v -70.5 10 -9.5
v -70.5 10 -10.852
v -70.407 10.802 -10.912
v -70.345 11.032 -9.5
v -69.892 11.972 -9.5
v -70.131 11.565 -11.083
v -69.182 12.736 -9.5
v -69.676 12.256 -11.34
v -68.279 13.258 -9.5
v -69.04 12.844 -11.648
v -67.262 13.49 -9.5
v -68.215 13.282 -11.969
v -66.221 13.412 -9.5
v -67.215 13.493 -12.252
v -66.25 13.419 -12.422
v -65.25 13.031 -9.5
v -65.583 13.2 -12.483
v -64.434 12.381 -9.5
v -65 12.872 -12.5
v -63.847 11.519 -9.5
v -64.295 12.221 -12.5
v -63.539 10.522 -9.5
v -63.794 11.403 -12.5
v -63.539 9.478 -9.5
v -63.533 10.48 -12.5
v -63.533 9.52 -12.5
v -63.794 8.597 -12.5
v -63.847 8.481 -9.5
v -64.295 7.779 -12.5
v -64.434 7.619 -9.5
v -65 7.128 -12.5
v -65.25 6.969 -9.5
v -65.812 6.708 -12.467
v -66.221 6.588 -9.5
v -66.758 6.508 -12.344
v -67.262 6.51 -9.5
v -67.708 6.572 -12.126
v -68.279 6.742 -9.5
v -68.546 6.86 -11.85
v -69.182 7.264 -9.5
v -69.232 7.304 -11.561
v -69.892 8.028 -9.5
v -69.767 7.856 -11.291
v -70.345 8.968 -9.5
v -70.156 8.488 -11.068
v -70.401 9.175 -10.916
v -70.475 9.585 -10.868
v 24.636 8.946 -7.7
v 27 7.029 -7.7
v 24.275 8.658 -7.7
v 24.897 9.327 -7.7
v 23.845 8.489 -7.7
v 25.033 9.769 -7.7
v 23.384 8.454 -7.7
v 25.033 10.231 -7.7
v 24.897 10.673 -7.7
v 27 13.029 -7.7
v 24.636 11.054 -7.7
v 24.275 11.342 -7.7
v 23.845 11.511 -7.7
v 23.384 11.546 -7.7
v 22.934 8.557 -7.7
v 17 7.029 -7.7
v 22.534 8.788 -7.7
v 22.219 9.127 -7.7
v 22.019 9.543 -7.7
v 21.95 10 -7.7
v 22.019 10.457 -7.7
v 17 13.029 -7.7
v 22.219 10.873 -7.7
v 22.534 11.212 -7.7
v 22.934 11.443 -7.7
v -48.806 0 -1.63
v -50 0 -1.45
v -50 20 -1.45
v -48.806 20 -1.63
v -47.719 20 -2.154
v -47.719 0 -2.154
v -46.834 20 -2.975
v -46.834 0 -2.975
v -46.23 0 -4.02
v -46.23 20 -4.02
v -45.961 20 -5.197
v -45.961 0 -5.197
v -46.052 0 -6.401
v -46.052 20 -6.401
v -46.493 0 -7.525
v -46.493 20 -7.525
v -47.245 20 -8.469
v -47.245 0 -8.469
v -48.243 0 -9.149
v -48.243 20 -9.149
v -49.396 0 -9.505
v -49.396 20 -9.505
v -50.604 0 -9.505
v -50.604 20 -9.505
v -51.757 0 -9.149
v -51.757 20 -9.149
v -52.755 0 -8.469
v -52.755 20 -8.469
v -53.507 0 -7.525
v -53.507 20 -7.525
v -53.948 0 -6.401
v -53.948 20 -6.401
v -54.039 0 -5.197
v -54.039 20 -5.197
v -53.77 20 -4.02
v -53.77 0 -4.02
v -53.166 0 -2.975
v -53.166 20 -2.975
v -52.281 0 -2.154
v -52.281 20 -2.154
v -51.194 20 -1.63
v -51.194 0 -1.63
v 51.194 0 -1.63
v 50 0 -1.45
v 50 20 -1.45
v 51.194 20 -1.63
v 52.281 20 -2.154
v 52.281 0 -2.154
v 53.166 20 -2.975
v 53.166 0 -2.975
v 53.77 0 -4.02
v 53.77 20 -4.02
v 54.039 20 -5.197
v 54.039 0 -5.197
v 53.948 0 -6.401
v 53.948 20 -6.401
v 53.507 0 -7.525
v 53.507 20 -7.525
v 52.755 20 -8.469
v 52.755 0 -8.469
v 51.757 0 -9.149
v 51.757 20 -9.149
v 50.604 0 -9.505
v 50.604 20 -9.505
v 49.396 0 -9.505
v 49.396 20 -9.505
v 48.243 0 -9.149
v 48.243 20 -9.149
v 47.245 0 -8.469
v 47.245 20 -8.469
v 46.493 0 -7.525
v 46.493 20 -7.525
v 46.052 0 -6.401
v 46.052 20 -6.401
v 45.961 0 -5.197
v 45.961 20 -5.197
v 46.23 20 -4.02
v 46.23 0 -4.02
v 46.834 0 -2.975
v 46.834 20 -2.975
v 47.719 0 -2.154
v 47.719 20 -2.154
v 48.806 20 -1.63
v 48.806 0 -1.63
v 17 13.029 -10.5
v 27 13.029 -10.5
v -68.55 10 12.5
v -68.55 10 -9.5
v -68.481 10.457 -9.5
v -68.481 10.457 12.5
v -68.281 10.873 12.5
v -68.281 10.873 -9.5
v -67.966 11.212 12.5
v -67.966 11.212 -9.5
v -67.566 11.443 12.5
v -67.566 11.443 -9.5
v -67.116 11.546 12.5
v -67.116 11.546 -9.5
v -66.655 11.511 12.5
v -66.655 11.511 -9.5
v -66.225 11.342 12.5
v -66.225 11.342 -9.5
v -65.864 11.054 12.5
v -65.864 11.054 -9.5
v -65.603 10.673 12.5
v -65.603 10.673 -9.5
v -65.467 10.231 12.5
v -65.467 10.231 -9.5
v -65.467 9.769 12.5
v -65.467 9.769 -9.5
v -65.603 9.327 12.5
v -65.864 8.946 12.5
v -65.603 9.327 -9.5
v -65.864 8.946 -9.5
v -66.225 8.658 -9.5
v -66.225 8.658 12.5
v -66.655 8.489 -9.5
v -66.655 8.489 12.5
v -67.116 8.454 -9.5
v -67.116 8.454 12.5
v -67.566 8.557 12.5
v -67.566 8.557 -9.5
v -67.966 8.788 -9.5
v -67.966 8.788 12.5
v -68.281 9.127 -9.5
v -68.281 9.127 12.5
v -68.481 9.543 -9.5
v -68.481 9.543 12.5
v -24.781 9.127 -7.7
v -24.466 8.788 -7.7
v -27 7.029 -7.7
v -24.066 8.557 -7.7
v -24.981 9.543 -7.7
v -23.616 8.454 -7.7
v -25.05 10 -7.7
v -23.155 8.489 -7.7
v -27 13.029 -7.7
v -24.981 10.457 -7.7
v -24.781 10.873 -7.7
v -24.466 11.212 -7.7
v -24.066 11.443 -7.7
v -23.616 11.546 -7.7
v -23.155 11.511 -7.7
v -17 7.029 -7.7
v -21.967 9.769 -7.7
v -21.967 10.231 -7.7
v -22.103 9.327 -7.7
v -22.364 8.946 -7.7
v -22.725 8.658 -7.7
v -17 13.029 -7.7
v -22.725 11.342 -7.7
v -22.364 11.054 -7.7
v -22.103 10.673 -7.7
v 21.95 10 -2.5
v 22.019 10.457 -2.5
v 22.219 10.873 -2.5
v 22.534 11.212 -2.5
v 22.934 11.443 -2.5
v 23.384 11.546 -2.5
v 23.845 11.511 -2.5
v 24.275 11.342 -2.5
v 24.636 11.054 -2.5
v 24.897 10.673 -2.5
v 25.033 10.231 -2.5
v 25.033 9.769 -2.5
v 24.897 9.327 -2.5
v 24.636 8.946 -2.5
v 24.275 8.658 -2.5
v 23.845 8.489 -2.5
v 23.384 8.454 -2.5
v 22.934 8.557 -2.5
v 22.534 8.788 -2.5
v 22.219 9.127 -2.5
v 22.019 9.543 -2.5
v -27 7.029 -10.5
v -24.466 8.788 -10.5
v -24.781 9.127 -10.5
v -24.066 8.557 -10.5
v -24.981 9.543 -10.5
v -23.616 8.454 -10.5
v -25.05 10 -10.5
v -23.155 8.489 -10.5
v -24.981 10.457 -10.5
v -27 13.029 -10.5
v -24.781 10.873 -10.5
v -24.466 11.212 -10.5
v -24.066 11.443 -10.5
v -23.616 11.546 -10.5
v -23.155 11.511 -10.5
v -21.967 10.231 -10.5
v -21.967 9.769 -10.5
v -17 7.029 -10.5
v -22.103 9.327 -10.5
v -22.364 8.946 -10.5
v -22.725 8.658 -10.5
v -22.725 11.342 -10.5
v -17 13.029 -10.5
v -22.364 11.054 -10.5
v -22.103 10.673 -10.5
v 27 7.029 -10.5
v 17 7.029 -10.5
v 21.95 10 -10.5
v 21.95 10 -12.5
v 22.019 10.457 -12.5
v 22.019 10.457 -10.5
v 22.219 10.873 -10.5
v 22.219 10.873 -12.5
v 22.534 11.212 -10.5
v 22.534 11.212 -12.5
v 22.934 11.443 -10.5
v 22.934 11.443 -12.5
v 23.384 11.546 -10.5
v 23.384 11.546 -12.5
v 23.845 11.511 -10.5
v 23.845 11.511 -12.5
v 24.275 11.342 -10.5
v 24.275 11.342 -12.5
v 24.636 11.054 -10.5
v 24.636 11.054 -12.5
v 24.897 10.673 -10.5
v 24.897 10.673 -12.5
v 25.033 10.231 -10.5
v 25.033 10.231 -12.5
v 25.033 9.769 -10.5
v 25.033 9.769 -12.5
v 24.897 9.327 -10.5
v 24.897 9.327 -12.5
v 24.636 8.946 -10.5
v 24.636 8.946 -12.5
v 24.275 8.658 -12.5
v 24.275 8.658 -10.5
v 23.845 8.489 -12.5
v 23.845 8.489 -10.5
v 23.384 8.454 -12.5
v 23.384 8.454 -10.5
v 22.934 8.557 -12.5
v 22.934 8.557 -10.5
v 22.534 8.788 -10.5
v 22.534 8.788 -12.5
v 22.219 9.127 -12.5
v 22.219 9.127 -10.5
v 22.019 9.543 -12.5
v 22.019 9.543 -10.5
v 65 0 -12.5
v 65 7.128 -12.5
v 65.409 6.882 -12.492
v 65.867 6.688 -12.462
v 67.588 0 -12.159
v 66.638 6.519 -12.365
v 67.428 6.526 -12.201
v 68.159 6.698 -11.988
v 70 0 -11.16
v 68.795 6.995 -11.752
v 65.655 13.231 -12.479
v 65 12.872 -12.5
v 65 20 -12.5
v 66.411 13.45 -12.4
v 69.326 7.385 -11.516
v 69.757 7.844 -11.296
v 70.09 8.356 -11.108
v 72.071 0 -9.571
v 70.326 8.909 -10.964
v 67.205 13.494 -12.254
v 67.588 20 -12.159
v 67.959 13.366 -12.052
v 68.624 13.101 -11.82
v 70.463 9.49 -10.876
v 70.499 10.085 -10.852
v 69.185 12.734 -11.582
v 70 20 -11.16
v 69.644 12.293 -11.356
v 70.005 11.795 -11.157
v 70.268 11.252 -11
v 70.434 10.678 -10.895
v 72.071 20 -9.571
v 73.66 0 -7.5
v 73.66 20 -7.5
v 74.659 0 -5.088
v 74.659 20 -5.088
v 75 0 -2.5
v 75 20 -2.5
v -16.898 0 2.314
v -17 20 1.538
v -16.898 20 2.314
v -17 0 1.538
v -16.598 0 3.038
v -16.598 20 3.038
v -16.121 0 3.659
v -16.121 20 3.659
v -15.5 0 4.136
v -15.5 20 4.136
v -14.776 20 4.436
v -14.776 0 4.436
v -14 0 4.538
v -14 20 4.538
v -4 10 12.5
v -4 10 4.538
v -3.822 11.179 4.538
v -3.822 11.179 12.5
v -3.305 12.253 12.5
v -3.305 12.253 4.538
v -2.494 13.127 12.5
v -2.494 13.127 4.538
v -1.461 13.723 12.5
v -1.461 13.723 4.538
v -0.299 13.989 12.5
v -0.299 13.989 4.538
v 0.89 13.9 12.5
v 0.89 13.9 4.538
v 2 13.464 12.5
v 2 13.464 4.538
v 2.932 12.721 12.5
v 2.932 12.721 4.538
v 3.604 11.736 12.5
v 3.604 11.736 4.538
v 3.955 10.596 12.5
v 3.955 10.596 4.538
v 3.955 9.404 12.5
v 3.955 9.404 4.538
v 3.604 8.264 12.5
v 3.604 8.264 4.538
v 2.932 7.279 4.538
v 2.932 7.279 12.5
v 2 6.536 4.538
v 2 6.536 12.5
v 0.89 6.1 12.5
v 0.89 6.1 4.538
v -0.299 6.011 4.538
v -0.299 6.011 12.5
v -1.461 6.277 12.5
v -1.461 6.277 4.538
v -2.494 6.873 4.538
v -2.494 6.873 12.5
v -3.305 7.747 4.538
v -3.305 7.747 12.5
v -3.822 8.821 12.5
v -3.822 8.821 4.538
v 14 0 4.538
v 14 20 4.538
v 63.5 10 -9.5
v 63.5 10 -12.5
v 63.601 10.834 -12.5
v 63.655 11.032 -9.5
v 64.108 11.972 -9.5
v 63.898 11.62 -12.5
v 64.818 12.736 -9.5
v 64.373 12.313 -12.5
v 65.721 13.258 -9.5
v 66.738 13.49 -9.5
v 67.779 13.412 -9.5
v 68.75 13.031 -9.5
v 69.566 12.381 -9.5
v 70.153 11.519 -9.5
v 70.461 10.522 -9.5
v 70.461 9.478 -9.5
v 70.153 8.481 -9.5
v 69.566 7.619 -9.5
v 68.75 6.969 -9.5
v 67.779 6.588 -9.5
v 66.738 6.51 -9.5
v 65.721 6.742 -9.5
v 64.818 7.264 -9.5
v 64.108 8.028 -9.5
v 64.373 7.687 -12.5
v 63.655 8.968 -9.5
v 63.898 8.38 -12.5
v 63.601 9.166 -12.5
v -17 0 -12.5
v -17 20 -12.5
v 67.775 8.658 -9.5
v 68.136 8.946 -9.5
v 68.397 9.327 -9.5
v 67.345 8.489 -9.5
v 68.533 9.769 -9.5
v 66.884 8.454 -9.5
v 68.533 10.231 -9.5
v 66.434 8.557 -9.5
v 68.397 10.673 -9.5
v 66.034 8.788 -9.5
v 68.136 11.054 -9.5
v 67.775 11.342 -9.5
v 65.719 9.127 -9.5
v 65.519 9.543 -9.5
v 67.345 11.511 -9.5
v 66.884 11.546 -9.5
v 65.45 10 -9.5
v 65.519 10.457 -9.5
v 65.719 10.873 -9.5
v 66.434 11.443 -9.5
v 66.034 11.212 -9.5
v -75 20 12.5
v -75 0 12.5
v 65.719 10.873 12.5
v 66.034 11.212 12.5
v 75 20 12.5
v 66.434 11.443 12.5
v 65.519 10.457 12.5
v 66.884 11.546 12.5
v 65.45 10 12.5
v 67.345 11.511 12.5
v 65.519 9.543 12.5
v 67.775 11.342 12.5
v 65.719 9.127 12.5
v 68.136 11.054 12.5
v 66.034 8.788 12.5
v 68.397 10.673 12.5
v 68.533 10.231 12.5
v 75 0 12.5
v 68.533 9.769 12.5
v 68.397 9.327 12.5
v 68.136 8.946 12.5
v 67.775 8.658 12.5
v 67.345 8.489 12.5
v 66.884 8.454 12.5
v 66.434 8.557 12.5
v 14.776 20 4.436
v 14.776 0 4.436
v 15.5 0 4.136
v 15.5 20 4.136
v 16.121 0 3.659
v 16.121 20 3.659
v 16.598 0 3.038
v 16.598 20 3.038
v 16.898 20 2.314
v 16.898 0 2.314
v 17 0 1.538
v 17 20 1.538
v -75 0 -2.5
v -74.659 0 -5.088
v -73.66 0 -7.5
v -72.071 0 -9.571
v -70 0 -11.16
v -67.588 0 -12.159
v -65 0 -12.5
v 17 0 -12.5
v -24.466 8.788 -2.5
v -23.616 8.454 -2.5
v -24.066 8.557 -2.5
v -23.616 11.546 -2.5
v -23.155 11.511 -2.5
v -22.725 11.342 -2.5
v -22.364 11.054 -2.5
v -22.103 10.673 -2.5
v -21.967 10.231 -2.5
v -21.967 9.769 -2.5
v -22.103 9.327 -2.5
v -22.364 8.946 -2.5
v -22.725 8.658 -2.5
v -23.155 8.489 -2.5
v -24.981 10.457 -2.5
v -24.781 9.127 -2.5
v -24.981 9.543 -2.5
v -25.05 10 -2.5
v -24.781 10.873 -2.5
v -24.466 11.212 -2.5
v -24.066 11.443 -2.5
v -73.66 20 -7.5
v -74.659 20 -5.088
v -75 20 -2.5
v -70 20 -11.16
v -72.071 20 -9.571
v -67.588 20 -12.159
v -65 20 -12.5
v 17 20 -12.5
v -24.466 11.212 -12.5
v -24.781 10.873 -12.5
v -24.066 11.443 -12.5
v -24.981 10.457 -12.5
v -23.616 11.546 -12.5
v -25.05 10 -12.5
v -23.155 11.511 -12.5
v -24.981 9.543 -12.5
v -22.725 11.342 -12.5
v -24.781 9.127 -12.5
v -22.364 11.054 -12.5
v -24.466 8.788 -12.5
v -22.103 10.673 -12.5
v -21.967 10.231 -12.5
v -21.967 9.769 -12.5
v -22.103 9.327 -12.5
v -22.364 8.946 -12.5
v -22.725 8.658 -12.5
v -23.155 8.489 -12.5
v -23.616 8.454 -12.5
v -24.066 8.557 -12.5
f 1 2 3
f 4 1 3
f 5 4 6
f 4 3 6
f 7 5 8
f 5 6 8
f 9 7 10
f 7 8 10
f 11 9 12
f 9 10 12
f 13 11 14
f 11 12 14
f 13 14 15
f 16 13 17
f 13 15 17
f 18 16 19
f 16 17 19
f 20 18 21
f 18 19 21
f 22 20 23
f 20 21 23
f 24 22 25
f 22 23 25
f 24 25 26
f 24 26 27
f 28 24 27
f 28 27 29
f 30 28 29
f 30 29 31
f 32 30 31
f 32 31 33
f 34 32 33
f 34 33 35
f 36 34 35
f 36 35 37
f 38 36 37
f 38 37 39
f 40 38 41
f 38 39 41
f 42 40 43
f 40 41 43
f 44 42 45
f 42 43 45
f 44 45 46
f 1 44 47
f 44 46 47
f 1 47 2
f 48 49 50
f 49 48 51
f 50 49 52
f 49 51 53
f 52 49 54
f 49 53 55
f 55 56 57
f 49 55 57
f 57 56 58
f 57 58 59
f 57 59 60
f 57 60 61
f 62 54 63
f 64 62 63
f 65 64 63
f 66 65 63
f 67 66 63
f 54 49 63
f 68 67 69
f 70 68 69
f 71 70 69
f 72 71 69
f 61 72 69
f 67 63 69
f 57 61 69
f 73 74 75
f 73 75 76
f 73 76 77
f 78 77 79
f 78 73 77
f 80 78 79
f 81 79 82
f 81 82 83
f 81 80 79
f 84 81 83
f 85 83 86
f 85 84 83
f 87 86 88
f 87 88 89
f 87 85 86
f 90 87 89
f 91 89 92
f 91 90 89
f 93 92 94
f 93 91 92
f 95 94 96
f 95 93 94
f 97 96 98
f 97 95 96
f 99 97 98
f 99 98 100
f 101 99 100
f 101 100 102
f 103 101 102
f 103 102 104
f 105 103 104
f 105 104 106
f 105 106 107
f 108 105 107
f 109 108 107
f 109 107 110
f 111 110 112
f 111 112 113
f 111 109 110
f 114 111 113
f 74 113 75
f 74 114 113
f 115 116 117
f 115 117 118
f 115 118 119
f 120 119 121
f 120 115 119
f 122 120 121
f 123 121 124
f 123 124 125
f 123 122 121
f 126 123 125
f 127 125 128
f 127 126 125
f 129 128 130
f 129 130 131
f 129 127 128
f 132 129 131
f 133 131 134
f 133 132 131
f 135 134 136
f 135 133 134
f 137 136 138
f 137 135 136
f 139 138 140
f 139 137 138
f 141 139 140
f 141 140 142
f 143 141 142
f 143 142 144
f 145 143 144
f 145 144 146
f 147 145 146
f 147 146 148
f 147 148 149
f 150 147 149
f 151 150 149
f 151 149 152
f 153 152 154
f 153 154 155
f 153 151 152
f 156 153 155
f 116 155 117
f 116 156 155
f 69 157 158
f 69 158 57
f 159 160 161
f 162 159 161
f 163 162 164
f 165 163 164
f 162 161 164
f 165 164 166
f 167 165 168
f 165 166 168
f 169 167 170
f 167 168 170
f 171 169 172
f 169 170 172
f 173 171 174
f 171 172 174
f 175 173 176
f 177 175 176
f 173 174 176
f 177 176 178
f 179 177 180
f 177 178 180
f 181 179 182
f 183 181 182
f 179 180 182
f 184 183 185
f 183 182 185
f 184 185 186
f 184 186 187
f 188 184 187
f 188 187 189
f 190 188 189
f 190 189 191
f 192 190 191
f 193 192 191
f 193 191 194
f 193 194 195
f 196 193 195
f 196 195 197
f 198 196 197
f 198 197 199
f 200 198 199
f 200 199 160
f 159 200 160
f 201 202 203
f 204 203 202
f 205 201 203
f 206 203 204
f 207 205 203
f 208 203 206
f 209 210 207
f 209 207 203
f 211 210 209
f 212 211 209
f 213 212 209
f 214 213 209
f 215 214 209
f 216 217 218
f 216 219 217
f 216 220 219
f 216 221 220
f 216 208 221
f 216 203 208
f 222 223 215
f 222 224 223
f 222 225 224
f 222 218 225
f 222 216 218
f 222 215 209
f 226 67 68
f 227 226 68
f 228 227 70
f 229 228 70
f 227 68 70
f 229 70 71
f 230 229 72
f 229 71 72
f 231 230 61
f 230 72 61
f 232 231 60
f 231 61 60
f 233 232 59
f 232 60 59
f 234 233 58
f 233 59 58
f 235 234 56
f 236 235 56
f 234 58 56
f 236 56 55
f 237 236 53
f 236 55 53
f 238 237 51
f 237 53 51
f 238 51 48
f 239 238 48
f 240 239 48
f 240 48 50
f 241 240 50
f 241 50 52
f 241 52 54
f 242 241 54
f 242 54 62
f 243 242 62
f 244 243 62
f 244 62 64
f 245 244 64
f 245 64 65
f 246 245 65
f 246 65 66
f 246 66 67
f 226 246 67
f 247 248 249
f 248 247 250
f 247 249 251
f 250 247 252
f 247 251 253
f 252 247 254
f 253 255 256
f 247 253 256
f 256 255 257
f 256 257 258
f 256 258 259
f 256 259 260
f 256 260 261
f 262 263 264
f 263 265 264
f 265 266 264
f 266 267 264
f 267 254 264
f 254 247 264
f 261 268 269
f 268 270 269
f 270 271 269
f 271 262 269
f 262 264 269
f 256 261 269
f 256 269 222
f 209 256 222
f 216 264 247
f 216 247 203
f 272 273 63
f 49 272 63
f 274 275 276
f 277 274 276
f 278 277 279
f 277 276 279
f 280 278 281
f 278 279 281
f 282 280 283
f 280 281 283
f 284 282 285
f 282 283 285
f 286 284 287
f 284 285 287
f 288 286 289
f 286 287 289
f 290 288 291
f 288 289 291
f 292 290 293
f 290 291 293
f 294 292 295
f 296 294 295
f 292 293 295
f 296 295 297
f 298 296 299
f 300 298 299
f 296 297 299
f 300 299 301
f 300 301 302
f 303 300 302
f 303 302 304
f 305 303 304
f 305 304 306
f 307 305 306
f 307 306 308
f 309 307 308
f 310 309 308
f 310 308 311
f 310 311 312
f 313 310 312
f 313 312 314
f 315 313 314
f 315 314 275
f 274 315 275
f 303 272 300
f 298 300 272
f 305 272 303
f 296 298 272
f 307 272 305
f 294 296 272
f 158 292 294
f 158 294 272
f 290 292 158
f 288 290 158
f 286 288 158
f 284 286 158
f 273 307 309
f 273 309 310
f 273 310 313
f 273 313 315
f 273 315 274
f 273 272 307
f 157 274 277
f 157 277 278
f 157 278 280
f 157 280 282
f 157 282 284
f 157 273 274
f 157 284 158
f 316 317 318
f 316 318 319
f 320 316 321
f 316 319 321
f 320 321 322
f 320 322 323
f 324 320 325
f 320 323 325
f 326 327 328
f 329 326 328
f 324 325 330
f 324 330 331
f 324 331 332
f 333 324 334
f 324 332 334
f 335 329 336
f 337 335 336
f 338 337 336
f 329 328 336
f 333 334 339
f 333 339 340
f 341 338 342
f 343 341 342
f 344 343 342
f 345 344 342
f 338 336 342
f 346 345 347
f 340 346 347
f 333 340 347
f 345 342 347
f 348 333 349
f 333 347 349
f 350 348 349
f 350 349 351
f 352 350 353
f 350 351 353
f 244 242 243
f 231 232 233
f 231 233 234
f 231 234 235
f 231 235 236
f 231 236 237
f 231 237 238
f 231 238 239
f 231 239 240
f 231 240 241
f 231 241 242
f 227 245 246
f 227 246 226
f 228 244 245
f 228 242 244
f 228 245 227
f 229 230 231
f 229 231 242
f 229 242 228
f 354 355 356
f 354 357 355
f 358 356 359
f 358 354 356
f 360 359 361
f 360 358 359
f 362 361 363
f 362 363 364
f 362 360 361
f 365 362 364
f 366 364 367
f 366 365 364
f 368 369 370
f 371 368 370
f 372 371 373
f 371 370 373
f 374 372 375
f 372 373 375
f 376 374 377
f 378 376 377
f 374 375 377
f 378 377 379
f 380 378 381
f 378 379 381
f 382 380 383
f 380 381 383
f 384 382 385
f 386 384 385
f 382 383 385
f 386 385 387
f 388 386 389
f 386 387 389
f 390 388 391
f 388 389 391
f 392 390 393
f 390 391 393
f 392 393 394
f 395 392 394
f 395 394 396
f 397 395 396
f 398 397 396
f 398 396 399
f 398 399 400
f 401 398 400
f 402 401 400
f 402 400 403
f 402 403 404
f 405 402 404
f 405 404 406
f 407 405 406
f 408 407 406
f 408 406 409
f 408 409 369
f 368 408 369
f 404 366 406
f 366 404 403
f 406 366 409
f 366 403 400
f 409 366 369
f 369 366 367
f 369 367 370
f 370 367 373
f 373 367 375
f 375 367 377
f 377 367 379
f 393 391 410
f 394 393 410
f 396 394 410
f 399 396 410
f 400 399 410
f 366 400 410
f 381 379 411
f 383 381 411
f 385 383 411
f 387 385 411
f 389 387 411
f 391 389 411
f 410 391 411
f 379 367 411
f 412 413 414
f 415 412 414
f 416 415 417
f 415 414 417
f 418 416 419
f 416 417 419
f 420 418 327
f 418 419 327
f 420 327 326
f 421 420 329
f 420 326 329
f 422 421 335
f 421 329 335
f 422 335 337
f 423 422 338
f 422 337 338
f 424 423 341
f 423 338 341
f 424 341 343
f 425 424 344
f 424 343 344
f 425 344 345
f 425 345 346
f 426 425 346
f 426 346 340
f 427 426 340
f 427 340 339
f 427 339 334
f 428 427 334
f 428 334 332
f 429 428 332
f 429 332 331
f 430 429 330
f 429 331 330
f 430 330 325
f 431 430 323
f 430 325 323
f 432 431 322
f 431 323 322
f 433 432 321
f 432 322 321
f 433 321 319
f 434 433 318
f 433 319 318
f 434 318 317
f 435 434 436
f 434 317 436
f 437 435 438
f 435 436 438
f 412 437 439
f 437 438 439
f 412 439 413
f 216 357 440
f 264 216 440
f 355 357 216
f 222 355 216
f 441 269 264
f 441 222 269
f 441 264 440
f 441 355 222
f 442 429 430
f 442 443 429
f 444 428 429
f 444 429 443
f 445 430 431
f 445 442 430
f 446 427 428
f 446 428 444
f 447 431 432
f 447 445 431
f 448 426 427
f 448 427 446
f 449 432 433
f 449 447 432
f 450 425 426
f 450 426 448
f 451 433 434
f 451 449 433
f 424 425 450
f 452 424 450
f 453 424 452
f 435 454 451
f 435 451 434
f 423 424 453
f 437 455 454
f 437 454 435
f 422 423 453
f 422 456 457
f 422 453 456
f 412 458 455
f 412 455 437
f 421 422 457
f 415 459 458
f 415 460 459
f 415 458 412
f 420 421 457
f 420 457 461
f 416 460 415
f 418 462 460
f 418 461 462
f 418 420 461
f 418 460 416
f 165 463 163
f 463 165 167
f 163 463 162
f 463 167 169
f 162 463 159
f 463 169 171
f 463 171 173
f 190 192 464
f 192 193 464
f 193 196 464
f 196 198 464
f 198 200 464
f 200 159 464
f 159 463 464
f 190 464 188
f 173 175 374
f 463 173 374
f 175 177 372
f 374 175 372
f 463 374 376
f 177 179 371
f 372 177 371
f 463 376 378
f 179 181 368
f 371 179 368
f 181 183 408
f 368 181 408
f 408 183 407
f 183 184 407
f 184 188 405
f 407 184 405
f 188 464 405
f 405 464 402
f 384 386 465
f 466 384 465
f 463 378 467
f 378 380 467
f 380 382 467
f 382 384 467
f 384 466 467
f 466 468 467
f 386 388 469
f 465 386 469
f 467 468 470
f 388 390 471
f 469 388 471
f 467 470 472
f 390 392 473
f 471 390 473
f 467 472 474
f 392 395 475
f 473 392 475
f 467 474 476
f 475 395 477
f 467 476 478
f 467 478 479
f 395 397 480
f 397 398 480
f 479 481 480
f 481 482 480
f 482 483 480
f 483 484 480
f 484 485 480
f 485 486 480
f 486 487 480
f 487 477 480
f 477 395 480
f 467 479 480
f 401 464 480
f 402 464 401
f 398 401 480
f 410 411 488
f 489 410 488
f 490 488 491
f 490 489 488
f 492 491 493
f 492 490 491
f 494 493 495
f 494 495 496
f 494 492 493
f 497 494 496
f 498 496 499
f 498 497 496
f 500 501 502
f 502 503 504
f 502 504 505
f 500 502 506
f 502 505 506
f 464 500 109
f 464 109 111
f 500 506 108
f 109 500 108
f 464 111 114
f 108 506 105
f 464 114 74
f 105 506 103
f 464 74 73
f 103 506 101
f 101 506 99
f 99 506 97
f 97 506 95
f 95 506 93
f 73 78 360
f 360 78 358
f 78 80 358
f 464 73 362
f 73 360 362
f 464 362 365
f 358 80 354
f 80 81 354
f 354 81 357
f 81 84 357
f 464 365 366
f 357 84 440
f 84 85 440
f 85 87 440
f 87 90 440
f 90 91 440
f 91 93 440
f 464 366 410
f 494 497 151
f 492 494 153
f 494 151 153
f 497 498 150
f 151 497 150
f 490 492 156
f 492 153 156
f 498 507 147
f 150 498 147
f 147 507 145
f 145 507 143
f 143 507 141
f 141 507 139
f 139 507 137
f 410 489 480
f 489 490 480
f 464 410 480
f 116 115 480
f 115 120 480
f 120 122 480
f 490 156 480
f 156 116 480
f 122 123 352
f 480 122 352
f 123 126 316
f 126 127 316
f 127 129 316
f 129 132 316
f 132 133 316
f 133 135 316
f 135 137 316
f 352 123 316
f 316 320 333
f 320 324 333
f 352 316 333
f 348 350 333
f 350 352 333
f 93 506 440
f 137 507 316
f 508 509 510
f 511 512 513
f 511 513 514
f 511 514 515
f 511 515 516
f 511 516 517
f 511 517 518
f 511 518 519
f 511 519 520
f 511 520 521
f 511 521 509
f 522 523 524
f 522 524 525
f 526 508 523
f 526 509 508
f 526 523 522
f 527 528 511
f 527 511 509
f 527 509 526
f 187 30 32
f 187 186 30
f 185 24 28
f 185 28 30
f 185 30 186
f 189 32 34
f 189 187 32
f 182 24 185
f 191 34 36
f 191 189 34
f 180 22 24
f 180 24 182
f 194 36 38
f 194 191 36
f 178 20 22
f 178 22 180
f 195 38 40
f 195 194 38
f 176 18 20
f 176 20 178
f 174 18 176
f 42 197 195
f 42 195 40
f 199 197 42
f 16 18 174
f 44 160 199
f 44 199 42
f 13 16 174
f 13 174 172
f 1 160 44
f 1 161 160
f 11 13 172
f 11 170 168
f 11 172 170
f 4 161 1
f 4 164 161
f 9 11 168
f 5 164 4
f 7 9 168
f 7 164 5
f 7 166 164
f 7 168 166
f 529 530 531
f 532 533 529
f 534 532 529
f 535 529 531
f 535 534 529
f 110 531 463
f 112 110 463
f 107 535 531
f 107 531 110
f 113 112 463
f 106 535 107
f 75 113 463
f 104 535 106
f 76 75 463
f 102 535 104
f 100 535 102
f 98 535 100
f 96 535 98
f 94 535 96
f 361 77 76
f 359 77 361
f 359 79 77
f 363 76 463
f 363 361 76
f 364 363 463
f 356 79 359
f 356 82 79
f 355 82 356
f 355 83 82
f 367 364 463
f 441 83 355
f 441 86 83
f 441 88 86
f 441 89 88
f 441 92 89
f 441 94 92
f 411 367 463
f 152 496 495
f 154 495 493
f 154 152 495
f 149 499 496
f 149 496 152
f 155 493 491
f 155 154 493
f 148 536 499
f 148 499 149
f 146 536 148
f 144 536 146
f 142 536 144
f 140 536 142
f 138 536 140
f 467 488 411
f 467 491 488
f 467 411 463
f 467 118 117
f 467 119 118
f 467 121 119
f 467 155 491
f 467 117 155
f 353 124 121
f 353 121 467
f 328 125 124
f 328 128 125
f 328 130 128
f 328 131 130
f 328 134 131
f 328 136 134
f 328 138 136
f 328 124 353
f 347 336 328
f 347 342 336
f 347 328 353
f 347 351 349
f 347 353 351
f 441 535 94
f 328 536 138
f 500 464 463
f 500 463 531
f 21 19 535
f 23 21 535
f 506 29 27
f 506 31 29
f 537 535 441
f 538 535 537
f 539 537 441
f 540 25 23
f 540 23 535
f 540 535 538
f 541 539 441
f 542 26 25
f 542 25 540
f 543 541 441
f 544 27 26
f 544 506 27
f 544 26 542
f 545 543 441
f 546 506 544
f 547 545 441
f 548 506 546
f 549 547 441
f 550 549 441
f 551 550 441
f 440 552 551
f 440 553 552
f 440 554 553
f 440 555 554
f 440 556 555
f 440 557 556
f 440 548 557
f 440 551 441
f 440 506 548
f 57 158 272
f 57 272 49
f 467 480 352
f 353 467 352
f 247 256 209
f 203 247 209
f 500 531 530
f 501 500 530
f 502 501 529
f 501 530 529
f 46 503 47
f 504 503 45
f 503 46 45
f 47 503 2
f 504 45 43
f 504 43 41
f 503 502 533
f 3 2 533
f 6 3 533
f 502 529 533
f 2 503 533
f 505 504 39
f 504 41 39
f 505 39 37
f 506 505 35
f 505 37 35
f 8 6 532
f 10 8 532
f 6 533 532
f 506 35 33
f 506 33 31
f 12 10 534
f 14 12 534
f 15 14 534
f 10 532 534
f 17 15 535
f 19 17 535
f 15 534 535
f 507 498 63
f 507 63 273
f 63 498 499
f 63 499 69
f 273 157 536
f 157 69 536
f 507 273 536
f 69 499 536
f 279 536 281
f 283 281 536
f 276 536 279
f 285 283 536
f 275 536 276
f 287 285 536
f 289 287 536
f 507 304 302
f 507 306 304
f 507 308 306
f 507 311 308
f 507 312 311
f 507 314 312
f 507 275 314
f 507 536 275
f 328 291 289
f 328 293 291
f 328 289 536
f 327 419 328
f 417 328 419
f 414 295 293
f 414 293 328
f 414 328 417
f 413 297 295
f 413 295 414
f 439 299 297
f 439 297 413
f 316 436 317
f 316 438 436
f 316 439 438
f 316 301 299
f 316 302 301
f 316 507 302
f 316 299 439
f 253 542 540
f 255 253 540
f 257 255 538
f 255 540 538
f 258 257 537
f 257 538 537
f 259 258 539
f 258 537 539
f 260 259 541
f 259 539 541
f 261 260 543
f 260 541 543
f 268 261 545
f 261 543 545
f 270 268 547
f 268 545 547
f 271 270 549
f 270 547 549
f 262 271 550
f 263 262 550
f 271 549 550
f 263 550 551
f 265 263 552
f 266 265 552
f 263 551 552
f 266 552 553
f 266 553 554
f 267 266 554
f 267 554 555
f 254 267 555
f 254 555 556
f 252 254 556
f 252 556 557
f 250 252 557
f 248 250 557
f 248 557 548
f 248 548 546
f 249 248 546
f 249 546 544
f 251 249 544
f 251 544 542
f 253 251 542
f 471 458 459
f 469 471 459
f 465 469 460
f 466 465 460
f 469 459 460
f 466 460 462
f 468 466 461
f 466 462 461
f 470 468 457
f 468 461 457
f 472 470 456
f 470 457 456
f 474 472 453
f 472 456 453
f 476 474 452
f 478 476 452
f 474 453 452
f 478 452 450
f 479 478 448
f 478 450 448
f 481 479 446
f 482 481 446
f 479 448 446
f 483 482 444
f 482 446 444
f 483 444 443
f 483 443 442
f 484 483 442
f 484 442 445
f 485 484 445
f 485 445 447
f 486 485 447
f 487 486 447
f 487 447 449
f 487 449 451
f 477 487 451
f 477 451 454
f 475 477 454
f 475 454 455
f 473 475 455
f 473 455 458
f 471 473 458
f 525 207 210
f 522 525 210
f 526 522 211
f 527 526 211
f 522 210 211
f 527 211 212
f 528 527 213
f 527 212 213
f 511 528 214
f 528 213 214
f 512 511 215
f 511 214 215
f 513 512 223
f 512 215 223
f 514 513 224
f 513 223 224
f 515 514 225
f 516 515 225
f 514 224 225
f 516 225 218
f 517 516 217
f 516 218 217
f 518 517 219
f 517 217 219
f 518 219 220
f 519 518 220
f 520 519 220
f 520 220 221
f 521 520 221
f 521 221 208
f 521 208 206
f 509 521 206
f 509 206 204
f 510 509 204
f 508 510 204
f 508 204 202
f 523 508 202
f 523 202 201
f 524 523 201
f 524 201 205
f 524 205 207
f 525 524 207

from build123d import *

# Parameters (mm, degrees)
SKETCH1_W           = 150
SKETCH1_H           = 25
SKETCH1_R           = 4.05
BOSS_EXTRUDE1_DEPTH = 20
FILLET1_R           = 10
SKETCH3_R           = 1.55
CUT_EXTRUDE1_DEPTH  = 26
SKETCH3_3_R         = 3.5
SKETCH3_3_R_2       = 1.55
CUT_EXTRUDE2_DEPTH  = 3
SKETCH4_W           = 34
SKETCH4_H           = 34.075617562
CUT_EXTRUDE3_DEPTH  = 21.0000001
SKETCH5_R           = 4
CUT_EXTRUDE4_DEPTH  = 10
FILLET4_R           = 3
SKETCH6_R           = 1.55
CUT_EXTRUDE5_DEPTH  = 10
SKETCH7_W           = 2.8
SKETCH7_H           = 6
CUT_EXTRUDE6_DEPTH  = 10


with BuildPart() as part:
    # Sketch1 → Boss-Extrude1 (new body)
    with BuildSketch(Plane(origin=(0, 0, 0), x_dir=(1, 0, 0), z_dir=(0, 1, 0))):
        Rectangle(SKETCH1_W, SKETCH1_H)
        with Locations(Location((-50, 5.5, 0), (0, 0, 270))):  # turned: the seam where the file's is
            Circle(SKETCH1_R, mode=Mode.SUBTRACT)
        with Locations(Location((50, 5.5, 0), (0, 0, 270))):  # turned: the seam where the file's is
            Circle(SKETCH1_R, mode=Mode.SUBTRACT)
    extrude(amount=BOSS_EXTRUDE1_DEPTH)

    # Fillet1
    fillet1_edges = [part.edges().sort_by_distance(p)[0] for p in [
        (-75, 10, -12.5),
        (75, 10, -12.5),
    ]]
    fillet(fillet1_edges, radius=FILLET1_R)

    # Sketch3 → Cut-Extrude1 (cut, through all)
    with BuildSketch(Plane(origin=(0, 0, -12.5), x_dir=(-1, 0, 0), z_dir=(0, 0, -1))):
        with Locations((-67, 10)):
            Circle(SKETCH3_R)
        with Locations((67, 10)):
            Circle(SKETCH3_R)
    extrude(amount=-CUT_EXTRUDE1_DEPTH, mode=Mode.SUBTRACT)

    # Sketch3_3 → Cut-Extrude2 (cut)
    with BuildSketch(Plane(origin=(0, 0, -12.5), x_dir=(-1, 0, 0), z_dir=(0, 0, -1))):
        with Locations((-67, 10)):
            Circle(SKETCH3_3_R)
        with Locations((-67, 10)):
            Circle(SKETCH3_3_R_2, mode=Mode.SUBTRACT)
        with Locations((67, 10)):
            Circle(SKETCH3_3_R)
        with Locations((67, 10)):
            Circle(SKETCH3_3_R_2, mode=Mode.SUBTRACT)
    extrude(amount=-CUT_EXTRUDE2_DEPTH, mode=Mode.SUBTRACT)

    # Sketch4 → Cut-Extrude3 (cut, through all)
    with BuildSketch(Plane(origin=(0, 20, 0), x_dir=(1, 0, 0), z_dir=(0, 1, 0))):
        with Locations((0, 12.5)):
            Rectangle(SKETCH4_W, SKETCH4_H)
    extrude(amount=-CUT_EXTRUDE3_DEPTH, mode=Mode.SUBTRACT)

    # Sketch5 → Cut-Extrude4 (cut)
    with BuildSketch(Plane(origin=(0, 0, 4.537808781), x_dir=(-1, 0, 0), z_dir=(0, 0, -1))):
        with Locations((0, 10)):
            Circle(SKETCH5_R)
    extrude(amount=-CUT_EXTRUDE4_DEPTH, mode=Mode.SUBTRACT)

    # Fillet4
    fillet4_edges = [part.edges().sort_by_distance(p)[0] for p in [
        (-17, 10, 4.537808781),
        (17, 10, 4.537808781),
    ]]
    fillet(fillet4_edges, radius=FILLET4_R)

    # Sketch6 → Cut-Extrude5 (cut)
    with BuildSketch(Plane(origin=(0, 0, -12.5), x_dir=(-1, 0, 0), z_dir=(0, 0, -1))):
        with Locations((-23.5, 10)):
            Circle(SKETCH6_R)
        with Locations((23.5, 10)):
            Circle(SKETCH6_R)
    extrude(amount=-CUT_EXTRUDE5_DEPTH, mode=Mode.SUBTRACT)

    # Sketch7 → Cut-Extrude6 (cut)
    with BuildSketch(Plane.ZY.offset(-17)):
        with Locations((-9.1, 10.0294943)):
            Rectangle(SKETCH7_W, SKETCH7_H)
    cut_extrude6 = extrude(amount=-CUT_EXTRUDE6_DEPTH, mode=Mode.SUBTRACT)

    # Mirror1: Cut-Extrude6 across plane
    add(cut_extrude6.mirror(Plane(origin=(0, 0, 0), x_dir=(0, 0, 1), z_dir=(1, 0, 0))), mode=Mode.SUBTRACT)


solid = part.part
